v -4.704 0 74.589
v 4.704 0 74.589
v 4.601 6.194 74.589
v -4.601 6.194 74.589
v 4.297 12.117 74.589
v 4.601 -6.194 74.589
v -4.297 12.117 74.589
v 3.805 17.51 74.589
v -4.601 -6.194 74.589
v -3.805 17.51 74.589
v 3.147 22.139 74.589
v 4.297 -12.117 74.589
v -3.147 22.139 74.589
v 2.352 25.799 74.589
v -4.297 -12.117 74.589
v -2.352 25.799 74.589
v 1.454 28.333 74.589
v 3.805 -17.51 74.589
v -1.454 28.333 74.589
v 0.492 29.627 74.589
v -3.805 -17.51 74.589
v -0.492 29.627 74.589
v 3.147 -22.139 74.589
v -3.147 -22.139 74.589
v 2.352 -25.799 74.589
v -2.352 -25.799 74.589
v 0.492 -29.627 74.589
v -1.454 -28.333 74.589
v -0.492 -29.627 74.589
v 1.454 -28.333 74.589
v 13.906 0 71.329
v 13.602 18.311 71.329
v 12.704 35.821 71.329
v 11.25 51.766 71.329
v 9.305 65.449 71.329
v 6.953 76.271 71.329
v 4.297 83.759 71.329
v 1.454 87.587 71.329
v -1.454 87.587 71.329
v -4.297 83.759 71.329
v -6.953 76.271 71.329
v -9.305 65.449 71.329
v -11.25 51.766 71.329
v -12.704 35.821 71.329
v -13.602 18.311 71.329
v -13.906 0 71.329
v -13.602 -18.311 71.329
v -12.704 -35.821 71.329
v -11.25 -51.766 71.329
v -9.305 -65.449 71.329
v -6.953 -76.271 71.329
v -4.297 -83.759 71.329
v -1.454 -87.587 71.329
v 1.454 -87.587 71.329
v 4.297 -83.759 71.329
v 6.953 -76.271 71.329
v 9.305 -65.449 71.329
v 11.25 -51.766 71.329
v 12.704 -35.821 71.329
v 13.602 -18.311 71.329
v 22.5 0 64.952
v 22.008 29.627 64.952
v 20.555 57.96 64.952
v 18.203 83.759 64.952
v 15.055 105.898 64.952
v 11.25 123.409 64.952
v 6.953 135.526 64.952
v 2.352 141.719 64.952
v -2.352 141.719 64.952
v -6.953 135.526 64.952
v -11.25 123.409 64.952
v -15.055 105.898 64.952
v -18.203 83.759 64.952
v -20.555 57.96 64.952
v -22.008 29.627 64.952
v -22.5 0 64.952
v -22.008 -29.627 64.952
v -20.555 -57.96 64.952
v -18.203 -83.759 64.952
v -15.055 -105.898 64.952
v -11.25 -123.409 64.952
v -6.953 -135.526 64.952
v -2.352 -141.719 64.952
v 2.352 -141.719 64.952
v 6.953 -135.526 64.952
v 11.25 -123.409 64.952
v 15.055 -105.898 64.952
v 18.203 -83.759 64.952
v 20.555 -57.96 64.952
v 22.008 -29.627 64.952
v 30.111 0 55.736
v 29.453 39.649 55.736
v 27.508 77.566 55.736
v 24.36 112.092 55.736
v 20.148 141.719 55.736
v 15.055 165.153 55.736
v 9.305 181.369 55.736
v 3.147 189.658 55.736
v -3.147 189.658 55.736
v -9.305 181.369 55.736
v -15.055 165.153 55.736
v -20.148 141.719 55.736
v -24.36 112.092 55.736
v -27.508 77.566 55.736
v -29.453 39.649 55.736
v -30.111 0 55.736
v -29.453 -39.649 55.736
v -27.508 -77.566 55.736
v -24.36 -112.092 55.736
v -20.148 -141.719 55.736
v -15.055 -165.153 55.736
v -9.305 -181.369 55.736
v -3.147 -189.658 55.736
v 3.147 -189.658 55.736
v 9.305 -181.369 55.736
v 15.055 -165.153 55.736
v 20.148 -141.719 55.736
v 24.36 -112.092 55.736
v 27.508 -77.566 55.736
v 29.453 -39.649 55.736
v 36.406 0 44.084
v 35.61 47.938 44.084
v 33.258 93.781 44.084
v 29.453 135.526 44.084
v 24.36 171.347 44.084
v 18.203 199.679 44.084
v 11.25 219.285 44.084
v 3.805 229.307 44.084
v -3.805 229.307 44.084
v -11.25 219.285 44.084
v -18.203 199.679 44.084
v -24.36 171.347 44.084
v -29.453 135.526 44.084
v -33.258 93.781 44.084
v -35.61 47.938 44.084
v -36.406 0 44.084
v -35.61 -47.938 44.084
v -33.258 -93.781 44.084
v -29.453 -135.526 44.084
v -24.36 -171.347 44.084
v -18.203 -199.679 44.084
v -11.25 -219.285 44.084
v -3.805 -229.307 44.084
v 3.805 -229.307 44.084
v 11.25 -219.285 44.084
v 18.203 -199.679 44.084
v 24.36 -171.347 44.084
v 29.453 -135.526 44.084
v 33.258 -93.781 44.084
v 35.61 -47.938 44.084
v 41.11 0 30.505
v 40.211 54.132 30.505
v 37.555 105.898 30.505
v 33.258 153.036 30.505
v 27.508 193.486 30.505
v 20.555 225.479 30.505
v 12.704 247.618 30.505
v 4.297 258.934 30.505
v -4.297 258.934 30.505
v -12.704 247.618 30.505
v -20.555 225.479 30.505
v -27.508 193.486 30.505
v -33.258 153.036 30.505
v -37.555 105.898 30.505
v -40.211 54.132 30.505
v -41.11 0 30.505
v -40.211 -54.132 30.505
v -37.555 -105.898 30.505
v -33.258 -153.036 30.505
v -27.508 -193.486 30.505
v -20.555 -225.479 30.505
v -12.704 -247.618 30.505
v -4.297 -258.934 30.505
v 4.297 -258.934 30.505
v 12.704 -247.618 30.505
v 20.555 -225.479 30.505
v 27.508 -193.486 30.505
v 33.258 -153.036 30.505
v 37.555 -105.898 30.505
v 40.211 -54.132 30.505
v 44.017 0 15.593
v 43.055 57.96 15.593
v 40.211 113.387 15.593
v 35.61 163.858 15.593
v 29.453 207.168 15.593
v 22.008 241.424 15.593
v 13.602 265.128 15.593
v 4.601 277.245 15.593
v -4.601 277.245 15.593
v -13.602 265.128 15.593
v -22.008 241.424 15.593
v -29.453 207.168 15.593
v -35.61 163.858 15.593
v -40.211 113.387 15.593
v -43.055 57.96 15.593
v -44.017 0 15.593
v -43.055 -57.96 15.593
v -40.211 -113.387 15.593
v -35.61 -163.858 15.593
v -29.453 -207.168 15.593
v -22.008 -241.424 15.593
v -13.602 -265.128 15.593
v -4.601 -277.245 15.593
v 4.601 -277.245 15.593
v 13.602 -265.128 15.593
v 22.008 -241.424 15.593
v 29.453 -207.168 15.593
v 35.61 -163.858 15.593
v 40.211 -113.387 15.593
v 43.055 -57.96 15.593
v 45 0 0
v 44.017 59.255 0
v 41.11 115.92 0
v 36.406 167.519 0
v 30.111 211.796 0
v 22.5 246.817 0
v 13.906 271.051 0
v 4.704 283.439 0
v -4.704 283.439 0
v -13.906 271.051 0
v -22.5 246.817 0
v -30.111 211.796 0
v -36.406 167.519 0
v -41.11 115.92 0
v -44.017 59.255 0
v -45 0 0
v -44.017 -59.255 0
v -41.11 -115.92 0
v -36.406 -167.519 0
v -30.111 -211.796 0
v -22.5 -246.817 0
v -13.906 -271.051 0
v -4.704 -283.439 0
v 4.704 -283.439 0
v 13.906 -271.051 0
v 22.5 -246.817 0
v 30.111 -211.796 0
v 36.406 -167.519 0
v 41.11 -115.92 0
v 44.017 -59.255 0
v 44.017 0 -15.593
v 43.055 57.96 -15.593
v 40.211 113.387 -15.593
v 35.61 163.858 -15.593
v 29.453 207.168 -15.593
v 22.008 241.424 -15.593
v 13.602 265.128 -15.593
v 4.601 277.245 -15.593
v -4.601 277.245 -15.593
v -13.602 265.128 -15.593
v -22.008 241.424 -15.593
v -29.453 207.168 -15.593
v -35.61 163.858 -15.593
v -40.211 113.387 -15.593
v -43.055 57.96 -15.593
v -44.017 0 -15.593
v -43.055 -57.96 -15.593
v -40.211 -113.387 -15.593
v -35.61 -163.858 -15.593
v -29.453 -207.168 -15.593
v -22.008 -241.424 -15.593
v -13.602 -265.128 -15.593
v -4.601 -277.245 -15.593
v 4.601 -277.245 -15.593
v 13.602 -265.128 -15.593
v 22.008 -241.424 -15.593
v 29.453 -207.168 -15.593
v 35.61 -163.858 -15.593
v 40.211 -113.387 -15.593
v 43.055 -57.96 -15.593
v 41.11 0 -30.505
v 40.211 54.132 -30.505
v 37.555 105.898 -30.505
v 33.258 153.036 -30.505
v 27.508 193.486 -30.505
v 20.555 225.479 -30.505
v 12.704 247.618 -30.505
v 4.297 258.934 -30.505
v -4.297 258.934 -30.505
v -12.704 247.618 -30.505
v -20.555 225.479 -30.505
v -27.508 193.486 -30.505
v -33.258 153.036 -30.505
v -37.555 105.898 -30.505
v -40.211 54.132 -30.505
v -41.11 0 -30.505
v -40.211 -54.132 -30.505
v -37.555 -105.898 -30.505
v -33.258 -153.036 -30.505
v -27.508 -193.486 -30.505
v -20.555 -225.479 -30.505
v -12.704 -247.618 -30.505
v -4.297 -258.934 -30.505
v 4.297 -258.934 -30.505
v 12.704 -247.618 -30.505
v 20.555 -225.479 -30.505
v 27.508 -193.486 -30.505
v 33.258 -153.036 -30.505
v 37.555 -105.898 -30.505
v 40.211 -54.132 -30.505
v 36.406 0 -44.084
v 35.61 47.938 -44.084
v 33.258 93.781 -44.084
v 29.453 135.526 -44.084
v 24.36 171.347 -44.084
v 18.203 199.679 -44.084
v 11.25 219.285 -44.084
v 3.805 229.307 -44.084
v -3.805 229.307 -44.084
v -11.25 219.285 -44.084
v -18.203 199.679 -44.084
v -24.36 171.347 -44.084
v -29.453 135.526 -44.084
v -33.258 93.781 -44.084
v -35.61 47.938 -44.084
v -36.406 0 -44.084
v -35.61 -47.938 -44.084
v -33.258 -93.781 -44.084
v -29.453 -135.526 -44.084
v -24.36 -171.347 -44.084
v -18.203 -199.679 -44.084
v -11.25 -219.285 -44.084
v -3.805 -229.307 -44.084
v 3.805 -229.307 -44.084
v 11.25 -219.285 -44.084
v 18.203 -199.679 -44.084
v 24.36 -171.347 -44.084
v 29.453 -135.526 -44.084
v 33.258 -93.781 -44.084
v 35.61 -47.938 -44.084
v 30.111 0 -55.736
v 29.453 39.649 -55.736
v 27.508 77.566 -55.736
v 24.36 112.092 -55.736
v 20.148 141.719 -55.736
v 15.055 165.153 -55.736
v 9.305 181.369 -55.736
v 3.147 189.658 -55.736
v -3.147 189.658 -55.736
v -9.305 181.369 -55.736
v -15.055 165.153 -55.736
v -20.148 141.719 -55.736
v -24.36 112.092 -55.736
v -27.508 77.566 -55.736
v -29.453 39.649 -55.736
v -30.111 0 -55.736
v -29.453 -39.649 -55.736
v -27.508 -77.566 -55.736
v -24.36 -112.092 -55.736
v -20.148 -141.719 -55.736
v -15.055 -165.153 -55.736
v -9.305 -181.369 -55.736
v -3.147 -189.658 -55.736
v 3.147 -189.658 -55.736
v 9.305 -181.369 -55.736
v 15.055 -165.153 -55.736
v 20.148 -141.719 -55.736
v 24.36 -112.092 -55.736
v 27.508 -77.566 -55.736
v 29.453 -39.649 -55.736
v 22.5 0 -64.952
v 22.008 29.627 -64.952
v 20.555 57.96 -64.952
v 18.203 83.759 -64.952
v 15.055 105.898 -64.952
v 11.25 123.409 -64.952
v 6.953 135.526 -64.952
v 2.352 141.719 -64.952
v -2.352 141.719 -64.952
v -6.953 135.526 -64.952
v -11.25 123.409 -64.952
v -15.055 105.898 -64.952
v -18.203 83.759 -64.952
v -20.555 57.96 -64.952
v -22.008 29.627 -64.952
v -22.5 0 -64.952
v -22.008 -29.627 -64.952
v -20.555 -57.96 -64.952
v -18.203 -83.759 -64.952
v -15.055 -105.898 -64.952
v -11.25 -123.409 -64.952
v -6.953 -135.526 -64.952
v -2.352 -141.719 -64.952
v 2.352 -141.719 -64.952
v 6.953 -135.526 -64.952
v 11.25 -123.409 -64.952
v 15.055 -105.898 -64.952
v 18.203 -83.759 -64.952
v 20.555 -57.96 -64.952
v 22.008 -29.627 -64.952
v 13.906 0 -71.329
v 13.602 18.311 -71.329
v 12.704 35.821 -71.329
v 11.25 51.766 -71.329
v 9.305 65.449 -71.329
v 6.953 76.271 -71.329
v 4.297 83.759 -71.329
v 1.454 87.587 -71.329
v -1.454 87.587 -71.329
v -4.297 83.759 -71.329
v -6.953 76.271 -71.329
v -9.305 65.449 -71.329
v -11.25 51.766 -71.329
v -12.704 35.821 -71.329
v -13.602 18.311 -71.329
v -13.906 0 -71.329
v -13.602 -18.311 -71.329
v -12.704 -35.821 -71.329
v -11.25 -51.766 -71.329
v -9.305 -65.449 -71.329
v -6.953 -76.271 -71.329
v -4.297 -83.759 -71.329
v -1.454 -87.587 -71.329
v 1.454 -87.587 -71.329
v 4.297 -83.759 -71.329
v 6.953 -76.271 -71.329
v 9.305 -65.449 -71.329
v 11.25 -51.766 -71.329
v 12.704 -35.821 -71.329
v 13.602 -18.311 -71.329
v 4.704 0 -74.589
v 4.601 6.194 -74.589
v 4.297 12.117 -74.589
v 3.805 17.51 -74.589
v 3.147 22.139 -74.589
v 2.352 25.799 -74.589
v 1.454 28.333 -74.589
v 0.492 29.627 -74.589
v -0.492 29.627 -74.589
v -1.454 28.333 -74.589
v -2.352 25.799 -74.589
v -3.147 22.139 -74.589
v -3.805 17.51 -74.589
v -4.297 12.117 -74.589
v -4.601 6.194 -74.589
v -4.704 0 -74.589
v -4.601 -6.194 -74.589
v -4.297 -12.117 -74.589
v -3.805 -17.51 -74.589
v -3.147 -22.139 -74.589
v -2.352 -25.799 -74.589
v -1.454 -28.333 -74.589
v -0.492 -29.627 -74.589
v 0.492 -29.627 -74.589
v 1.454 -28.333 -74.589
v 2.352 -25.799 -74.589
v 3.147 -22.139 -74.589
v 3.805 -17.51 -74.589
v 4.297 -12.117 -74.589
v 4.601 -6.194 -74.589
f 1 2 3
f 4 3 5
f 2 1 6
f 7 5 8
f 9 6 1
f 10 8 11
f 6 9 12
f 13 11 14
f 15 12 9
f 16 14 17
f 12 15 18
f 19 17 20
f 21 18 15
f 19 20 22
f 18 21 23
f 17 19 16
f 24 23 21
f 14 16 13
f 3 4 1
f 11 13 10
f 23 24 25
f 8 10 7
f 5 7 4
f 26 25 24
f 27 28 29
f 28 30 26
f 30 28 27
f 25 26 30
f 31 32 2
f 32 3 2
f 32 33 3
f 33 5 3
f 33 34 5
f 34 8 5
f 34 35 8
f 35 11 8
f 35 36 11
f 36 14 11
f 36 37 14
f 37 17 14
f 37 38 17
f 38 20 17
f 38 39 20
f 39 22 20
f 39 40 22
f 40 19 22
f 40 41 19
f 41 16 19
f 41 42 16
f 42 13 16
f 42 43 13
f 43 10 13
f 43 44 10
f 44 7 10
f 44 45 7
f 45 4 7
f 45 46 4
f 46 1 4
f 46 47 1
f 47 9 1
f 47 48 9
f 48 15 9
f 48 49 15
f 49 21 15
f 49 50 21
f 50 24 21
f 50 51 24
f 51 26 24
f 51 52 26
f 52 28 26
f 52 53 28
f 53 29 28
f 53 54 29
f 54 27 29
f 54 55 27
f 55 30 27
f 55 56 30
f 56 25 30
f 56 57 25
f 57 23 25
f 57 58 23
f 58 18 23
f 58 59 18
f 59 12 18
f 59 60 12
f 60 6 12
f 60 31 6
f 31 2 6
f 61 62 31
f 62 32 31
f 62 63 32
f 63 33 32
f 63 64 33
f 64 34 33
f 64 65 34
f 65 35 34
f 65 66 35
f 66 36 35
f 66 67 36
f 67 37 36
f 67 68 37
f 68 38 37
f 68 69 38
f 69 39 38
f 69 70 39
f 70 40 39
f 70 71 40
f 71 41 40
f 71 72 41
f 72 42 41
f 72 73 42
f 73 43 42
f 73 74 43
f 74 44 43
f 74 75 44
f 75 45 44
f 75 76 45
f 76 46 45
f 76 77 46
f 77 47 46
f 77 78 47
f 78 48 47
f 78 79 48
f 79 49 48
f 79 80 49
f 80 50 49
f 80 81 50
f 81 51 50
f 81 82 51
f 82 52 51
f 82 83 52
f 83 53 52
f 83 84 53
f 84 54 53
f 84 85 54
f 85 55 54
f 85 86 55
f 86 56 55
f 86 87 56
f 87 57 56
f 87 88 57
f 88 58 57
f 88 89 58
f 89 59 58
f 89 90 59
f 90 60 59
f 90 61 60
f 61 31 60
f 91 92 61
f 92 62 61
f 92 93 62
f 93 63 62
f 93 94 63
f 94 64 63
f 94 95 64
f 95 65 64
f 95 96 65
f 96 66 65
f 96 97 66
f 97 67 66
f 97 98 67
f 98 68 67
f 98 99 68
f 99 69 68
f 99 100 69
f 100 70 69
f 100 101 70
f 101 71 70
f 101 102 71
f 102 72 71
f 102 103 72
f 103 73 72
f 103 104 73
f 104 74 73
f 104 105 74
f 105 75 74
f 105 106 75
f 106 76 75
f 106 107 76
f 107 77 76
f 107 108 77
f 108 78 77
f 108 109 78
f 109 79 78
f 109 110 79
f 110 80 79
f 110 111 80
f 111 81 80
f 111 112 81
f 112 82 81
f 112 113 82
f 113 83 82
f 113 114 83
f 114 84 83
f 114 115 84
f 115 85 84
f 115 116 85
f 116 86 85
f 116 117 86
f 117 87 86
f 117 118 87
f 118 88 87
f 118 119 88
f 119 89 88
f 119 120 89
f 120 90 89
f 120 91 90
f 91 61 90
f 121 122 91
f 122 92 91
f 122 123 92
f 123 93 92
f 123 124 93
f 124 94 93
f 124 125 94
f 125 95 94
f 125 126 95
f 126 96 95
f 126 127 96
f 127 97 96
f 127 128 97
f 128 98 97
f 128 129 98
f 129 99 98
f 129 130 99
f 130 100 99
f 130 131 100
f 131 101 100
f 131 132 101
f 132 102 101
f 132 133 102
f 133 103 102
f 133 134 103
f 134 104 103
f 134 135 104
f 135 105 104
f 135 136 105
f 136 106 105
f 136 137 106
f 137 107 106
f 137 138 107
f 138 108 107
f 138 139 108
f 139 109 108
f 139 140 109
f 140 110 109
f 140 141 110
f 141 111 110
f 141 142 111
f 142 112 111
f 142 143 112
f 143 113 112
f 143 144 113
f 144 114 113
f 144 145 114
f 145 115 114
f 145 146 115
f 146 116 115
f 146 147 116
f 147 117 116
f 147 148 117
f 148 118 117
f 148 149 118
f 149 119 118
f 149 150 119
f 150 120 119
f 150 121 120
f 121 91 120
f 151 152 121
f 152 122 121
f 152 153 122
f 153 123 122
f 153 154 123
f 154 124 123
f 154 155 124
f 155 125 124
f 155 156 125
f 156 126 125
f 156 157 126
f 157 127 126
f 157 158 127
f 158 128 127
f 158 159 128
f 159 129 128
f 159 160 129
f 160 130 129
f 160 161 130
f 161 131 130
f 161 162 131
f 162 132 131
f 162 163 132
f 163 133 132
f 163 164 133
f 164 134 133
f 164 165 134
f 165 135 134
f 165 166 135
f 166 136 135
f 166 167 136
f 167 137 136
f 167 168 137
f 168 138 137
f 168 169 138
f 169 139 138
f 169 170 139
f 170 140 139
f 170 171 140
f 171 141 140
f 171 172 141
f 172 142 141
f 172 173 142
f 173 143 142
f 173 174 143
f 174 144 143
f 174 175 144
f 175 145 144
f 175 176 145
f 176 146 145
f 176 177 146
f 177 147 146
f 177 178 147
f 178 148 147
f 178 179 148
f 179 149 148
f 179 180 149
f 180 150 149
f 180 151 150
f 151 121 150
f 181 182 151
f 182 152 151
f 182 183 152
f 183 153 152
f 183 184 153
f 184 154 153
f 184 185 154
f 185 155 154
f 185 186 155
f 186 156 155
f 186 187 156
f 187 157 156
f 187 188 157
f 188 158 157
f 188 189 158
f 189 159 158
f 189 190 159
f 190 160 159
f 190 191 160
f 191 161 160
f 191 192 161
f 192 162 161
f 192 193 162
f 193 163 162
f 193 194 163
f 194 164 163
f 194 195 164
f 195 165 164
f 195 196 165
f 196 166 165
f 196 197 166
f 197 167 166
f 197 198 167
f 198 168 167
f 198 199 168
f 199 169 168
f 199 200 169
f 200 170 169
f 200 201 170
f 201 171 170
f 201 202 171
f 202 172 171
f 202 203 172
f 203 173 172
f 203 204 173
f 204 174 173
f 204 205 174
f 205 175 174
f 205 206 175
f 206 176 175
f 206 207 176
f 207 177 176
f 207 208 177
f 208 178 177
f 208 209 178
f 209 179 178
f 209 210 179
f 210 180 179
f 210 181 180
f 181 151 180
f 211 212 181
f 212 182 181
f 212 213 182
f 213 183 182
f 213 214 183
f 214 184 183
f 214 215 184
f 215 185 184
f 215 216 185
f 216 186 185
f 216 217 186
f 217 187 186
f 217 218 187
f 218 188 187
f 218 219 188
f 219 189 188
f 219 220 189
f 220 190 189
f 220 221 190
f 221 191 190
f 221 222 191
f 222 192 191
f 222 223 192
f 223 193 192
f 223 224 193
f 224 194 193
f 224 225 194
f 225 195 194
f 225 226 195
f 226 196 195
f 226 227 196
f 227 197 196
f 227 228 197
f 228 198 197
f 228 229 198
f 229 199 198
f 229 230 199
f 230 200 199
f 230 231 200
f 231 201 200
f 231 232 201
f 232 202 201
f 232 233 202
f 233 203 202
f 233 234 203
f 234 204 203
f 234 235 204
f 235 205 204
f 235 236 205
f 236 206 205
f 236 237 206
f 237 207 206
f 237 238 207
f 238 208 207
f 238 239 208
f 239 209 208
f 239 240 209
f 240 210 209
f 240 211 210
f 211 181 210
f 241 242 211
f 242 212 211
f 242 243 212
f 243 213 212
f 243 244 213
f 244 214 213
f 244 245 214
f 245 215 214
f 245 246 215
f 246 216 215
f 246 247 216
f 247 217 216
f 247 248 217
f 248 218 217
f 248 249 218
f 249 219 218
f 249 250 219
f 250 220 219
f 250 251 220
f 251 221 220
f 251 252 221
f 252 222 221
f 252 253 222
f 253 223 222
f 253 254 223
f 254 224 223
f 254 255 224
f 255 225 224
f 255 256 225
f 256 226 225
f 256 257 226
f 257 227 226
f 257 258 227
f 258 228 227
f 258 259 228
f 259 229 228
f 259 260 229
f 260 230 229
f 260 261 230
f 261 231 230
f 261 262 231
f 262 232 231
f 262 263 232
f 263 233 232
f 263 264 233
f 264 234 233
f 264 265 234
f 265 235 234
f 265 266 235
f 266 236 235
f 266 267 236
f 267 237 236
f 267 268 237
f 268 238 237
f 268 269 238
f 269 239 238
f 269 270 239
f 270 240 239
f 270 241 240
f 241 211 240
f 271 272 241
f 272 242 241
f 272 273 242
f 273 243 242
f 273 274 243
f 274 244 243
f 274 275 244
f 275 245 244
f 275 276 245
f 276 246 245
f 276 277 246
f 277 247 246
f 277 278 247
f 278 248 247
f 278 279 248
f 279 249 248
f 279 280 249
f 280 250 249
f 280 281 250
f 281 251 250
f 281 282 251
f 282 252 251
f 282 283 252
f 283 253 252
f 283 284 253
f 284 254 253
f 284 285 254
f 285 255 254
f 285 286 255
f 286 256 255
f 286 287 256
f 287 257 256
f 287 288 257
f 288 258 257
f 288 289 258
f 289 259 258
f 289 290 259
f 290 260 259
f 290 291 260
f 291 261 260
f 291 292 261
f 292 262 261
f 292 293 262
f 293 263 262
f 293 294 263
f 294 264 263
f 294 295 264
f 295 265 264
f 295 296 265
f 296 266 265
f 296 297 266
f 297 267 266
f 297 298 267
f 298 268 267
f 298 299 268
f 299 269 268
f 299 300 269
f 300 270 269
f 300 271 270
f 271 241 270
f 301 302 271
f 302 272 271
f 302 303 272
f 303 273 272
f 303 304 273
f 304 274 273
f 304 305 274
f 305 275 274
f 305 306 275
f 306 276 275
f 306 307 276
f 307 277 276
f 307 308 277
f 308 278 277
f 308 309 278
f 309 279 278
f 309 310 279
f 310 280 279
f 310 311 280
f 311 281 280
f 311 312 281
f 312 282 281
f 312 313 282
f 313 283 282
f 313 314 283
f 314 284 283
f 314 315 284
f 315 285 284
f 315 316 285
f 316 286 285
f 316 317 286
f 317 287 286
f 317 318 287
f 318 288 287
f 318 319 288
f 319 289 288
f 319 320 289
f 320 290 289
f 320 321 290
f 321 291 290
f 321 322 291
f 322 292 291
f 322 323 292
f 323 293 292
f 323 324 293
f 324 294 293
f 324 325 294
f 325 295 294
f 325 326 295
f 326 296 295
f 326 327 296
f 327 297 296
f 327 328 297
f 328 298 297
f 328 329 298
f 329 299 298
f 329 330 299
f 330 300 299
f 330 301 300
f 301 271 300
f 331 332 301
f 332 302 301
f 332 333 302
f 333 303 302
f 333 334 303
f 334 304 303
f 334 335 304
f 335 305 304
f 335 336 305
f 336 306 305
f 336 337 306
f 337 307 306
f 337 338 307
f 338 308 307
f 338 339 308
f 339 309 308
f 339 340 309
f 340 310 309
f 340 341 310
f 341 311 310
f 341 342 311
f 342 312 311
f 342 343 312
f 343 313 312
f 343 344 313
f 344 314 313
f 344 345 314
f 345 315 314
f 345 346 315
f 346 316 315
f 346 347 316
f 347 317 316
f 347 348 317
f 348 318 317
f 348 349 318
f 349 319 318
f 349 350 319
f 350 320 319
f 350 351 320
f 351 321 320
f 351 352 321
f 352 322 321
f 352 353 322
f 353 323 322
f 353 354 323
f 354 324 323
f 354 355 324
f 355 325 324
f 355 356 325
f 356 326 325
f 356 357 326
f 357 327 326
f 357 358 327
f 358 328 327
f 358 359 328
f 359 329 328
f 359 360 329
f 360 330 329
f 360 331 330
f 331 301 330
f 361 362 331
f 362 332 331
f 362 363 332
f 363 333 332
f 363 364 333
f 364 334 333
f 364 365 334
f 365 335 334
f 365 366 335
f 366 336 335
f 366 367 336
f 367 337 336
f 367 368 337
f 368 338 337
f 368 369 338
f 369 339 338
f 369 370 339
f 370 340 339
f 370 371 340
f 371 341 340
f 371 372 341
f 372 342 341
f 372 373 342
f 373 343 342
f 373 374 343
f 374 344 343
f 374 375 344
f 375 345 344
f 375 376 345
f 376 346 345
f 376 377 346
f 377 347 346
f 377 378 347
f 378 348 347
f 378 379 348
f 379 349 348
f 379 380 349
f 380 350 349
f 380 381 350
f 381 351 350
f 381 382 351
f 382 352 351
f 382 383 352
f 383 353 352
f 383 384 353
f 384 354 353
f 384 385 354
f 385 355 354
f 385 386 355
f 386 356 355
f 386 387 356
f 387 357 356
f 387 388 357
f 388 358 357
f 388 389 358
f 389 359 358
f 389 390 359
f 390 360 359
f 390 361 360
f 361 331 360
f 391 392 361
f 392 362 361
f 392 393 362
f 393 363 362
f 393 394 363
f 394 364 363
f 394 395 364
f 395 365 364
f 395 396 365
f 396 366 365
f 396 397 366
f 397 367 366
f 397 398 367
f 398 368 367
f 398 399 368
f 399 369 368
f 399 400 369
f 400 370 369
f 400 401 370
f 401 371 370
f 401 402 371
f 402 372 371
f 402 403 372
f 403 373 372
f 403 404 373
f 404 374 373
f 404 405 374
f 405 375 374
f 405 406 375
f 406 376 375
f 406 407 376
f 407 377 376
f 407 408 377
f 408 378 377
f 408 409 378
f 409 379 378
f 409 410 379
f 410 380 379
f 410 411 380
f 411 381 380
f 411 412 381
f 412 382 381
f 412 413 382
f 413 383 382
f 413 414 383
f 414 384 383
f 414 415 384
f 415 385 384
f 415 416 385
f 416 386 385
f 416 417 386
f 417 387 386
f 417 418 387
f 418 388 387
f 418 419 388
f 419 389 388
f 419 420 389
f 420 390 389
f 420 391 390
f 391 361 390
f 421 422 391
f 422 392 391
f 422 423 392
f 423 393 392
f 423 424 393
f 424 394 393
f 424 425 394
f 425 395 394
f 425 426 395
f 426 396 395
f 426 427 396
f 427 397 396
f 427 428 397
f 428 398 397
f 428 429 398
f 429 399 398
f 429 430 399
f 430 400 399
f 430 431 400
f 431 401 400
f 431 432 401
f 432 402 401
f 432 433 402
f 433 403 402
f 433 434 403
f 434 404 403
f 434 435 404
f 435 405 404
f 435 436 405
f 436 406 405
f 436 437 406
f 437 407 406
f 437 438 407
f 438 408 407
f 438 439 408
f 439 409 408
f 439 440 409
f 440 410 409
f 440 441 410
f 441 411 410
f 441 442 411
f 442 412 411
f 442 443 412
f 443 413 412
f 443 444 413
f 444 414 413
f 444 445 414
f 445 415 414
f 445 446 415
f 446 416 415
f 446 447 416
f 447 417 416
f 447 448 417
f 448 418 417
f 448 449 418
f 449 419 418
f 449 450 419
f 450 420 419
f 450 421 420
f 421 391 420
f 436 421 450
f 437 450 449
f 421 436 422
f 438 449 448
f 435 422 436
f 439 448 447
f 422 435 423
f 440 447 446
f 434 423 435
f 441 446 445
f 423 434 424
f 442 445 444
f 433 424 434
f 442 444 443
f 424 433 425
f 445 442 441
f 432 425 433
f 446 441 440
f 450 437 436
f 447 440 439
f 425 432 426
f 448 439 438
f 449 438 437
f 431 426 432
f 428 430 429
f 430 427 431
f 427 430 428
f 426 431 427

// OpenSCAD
// Generated by SolidPython 1.0.1 on 2020-07-29 00:46:46


scale(v = [3, 19, 5]) {
	sphere(r = 15);
}
/***********************************************
*********      SolidPython code:      **********
************************************************
 
# import packages: SolidPython
from solid import *
from solid.utils import *
from itertools import chain, combinations, permutations


class Resize:

    def __init__(self, scad_file):
        self.scad_file = scad_file
        #self.scad_file = import_scad(scad_file)
        # cone/cylinder param:
        self.r1 = 0
        self.r2 = 0
        self.h = 0
        # rectangular prism param:
        self.w = 0
        self.l = 0
        # ellipse param:
        self.r = 0

    # import OpenScad code (file name corresponds to shape)


    # classify shape + parameters
    def assign(self, param1, param2, param3):
        if self.scad_file == 'cone.scad':
            self.r1 = param1
            self.r2 = param2
            self.h = param3
        elif self.scad_file == 'cylinder.scad':
            self.r1 = param1
            self.r2 = param2
            self.h = param3
        elif self.scad_file == 'rectangularPrism.scad':
            self.h = param1
            self.l = param2
            self.w = param3
        else:
            self.r = param1
            self.h = param2

    # resize parameters
    def iterate(self):
        x = range(3, 20, 2)
        i = 1
        if self.scad_file == 'cone.scad':
            tempList = list(permutations(x, 2))
            for temp in tempList:
                param1 = temp[0]
                param2 = temp[1]
                filepath = 'produced_scad_files/' + 'cone' + str(param1) + '_' + str(param2) + '_' + '.scad'
                scad_render_to_file(cylinder(h=param1, r1=param2, r2=0), filepath)

        elif self.scad_file == 'cylinder.scad':
            tempList = list(permutations(x, 3))
            for temp in tempList:
                param1 = temp[0]
                param2 = temp[1]
                filepath = 'produced_scad_files/' + 'cylinder' + str(param1) + '_' + str(param2) + '_' + '.scad'
                scad_render_to_file(cylinder(h=param1, r1=param2, r2=param2), filepath)

        elif self.scad_file == 'rectangularPrism.scad':
            tempList = list(permutations(x, 3))
            for temp in tempList:
                param1 = temp[0]
                param2 = temp[1]
                param3 = temp[2]
                filepath = 'produced_scad_files/' + 'rectangularPrism' + str(param1) + '_' + str(param2) + '_' + str(
                    param3) + '.scad'
                scad_render_to_file(cube(size=(param1, param2, param3)), filepath)

        elif self.scad_file == 'ellipse.scad':
            tempList = list(permutations(x, 4))
            for temp in tempList:
                param1 = temp[0]
                param2 = temp[1]
                param3 = temp[2]
                param4 = temp[3]
                filepath = 'produced_scad_files/' + 'ellipse' + str(param1) + '_' + str(param2) + '_' + str(param3) + '_' + str(param4) + '.scad'
                scad_render_to_file(scale([param1, param2, param3])(sphere(r=param4)), filepath)

    def render_to_scadfile(self):
        scad_render_to_file(scad, 'example.scad') 
 
************************************************/
